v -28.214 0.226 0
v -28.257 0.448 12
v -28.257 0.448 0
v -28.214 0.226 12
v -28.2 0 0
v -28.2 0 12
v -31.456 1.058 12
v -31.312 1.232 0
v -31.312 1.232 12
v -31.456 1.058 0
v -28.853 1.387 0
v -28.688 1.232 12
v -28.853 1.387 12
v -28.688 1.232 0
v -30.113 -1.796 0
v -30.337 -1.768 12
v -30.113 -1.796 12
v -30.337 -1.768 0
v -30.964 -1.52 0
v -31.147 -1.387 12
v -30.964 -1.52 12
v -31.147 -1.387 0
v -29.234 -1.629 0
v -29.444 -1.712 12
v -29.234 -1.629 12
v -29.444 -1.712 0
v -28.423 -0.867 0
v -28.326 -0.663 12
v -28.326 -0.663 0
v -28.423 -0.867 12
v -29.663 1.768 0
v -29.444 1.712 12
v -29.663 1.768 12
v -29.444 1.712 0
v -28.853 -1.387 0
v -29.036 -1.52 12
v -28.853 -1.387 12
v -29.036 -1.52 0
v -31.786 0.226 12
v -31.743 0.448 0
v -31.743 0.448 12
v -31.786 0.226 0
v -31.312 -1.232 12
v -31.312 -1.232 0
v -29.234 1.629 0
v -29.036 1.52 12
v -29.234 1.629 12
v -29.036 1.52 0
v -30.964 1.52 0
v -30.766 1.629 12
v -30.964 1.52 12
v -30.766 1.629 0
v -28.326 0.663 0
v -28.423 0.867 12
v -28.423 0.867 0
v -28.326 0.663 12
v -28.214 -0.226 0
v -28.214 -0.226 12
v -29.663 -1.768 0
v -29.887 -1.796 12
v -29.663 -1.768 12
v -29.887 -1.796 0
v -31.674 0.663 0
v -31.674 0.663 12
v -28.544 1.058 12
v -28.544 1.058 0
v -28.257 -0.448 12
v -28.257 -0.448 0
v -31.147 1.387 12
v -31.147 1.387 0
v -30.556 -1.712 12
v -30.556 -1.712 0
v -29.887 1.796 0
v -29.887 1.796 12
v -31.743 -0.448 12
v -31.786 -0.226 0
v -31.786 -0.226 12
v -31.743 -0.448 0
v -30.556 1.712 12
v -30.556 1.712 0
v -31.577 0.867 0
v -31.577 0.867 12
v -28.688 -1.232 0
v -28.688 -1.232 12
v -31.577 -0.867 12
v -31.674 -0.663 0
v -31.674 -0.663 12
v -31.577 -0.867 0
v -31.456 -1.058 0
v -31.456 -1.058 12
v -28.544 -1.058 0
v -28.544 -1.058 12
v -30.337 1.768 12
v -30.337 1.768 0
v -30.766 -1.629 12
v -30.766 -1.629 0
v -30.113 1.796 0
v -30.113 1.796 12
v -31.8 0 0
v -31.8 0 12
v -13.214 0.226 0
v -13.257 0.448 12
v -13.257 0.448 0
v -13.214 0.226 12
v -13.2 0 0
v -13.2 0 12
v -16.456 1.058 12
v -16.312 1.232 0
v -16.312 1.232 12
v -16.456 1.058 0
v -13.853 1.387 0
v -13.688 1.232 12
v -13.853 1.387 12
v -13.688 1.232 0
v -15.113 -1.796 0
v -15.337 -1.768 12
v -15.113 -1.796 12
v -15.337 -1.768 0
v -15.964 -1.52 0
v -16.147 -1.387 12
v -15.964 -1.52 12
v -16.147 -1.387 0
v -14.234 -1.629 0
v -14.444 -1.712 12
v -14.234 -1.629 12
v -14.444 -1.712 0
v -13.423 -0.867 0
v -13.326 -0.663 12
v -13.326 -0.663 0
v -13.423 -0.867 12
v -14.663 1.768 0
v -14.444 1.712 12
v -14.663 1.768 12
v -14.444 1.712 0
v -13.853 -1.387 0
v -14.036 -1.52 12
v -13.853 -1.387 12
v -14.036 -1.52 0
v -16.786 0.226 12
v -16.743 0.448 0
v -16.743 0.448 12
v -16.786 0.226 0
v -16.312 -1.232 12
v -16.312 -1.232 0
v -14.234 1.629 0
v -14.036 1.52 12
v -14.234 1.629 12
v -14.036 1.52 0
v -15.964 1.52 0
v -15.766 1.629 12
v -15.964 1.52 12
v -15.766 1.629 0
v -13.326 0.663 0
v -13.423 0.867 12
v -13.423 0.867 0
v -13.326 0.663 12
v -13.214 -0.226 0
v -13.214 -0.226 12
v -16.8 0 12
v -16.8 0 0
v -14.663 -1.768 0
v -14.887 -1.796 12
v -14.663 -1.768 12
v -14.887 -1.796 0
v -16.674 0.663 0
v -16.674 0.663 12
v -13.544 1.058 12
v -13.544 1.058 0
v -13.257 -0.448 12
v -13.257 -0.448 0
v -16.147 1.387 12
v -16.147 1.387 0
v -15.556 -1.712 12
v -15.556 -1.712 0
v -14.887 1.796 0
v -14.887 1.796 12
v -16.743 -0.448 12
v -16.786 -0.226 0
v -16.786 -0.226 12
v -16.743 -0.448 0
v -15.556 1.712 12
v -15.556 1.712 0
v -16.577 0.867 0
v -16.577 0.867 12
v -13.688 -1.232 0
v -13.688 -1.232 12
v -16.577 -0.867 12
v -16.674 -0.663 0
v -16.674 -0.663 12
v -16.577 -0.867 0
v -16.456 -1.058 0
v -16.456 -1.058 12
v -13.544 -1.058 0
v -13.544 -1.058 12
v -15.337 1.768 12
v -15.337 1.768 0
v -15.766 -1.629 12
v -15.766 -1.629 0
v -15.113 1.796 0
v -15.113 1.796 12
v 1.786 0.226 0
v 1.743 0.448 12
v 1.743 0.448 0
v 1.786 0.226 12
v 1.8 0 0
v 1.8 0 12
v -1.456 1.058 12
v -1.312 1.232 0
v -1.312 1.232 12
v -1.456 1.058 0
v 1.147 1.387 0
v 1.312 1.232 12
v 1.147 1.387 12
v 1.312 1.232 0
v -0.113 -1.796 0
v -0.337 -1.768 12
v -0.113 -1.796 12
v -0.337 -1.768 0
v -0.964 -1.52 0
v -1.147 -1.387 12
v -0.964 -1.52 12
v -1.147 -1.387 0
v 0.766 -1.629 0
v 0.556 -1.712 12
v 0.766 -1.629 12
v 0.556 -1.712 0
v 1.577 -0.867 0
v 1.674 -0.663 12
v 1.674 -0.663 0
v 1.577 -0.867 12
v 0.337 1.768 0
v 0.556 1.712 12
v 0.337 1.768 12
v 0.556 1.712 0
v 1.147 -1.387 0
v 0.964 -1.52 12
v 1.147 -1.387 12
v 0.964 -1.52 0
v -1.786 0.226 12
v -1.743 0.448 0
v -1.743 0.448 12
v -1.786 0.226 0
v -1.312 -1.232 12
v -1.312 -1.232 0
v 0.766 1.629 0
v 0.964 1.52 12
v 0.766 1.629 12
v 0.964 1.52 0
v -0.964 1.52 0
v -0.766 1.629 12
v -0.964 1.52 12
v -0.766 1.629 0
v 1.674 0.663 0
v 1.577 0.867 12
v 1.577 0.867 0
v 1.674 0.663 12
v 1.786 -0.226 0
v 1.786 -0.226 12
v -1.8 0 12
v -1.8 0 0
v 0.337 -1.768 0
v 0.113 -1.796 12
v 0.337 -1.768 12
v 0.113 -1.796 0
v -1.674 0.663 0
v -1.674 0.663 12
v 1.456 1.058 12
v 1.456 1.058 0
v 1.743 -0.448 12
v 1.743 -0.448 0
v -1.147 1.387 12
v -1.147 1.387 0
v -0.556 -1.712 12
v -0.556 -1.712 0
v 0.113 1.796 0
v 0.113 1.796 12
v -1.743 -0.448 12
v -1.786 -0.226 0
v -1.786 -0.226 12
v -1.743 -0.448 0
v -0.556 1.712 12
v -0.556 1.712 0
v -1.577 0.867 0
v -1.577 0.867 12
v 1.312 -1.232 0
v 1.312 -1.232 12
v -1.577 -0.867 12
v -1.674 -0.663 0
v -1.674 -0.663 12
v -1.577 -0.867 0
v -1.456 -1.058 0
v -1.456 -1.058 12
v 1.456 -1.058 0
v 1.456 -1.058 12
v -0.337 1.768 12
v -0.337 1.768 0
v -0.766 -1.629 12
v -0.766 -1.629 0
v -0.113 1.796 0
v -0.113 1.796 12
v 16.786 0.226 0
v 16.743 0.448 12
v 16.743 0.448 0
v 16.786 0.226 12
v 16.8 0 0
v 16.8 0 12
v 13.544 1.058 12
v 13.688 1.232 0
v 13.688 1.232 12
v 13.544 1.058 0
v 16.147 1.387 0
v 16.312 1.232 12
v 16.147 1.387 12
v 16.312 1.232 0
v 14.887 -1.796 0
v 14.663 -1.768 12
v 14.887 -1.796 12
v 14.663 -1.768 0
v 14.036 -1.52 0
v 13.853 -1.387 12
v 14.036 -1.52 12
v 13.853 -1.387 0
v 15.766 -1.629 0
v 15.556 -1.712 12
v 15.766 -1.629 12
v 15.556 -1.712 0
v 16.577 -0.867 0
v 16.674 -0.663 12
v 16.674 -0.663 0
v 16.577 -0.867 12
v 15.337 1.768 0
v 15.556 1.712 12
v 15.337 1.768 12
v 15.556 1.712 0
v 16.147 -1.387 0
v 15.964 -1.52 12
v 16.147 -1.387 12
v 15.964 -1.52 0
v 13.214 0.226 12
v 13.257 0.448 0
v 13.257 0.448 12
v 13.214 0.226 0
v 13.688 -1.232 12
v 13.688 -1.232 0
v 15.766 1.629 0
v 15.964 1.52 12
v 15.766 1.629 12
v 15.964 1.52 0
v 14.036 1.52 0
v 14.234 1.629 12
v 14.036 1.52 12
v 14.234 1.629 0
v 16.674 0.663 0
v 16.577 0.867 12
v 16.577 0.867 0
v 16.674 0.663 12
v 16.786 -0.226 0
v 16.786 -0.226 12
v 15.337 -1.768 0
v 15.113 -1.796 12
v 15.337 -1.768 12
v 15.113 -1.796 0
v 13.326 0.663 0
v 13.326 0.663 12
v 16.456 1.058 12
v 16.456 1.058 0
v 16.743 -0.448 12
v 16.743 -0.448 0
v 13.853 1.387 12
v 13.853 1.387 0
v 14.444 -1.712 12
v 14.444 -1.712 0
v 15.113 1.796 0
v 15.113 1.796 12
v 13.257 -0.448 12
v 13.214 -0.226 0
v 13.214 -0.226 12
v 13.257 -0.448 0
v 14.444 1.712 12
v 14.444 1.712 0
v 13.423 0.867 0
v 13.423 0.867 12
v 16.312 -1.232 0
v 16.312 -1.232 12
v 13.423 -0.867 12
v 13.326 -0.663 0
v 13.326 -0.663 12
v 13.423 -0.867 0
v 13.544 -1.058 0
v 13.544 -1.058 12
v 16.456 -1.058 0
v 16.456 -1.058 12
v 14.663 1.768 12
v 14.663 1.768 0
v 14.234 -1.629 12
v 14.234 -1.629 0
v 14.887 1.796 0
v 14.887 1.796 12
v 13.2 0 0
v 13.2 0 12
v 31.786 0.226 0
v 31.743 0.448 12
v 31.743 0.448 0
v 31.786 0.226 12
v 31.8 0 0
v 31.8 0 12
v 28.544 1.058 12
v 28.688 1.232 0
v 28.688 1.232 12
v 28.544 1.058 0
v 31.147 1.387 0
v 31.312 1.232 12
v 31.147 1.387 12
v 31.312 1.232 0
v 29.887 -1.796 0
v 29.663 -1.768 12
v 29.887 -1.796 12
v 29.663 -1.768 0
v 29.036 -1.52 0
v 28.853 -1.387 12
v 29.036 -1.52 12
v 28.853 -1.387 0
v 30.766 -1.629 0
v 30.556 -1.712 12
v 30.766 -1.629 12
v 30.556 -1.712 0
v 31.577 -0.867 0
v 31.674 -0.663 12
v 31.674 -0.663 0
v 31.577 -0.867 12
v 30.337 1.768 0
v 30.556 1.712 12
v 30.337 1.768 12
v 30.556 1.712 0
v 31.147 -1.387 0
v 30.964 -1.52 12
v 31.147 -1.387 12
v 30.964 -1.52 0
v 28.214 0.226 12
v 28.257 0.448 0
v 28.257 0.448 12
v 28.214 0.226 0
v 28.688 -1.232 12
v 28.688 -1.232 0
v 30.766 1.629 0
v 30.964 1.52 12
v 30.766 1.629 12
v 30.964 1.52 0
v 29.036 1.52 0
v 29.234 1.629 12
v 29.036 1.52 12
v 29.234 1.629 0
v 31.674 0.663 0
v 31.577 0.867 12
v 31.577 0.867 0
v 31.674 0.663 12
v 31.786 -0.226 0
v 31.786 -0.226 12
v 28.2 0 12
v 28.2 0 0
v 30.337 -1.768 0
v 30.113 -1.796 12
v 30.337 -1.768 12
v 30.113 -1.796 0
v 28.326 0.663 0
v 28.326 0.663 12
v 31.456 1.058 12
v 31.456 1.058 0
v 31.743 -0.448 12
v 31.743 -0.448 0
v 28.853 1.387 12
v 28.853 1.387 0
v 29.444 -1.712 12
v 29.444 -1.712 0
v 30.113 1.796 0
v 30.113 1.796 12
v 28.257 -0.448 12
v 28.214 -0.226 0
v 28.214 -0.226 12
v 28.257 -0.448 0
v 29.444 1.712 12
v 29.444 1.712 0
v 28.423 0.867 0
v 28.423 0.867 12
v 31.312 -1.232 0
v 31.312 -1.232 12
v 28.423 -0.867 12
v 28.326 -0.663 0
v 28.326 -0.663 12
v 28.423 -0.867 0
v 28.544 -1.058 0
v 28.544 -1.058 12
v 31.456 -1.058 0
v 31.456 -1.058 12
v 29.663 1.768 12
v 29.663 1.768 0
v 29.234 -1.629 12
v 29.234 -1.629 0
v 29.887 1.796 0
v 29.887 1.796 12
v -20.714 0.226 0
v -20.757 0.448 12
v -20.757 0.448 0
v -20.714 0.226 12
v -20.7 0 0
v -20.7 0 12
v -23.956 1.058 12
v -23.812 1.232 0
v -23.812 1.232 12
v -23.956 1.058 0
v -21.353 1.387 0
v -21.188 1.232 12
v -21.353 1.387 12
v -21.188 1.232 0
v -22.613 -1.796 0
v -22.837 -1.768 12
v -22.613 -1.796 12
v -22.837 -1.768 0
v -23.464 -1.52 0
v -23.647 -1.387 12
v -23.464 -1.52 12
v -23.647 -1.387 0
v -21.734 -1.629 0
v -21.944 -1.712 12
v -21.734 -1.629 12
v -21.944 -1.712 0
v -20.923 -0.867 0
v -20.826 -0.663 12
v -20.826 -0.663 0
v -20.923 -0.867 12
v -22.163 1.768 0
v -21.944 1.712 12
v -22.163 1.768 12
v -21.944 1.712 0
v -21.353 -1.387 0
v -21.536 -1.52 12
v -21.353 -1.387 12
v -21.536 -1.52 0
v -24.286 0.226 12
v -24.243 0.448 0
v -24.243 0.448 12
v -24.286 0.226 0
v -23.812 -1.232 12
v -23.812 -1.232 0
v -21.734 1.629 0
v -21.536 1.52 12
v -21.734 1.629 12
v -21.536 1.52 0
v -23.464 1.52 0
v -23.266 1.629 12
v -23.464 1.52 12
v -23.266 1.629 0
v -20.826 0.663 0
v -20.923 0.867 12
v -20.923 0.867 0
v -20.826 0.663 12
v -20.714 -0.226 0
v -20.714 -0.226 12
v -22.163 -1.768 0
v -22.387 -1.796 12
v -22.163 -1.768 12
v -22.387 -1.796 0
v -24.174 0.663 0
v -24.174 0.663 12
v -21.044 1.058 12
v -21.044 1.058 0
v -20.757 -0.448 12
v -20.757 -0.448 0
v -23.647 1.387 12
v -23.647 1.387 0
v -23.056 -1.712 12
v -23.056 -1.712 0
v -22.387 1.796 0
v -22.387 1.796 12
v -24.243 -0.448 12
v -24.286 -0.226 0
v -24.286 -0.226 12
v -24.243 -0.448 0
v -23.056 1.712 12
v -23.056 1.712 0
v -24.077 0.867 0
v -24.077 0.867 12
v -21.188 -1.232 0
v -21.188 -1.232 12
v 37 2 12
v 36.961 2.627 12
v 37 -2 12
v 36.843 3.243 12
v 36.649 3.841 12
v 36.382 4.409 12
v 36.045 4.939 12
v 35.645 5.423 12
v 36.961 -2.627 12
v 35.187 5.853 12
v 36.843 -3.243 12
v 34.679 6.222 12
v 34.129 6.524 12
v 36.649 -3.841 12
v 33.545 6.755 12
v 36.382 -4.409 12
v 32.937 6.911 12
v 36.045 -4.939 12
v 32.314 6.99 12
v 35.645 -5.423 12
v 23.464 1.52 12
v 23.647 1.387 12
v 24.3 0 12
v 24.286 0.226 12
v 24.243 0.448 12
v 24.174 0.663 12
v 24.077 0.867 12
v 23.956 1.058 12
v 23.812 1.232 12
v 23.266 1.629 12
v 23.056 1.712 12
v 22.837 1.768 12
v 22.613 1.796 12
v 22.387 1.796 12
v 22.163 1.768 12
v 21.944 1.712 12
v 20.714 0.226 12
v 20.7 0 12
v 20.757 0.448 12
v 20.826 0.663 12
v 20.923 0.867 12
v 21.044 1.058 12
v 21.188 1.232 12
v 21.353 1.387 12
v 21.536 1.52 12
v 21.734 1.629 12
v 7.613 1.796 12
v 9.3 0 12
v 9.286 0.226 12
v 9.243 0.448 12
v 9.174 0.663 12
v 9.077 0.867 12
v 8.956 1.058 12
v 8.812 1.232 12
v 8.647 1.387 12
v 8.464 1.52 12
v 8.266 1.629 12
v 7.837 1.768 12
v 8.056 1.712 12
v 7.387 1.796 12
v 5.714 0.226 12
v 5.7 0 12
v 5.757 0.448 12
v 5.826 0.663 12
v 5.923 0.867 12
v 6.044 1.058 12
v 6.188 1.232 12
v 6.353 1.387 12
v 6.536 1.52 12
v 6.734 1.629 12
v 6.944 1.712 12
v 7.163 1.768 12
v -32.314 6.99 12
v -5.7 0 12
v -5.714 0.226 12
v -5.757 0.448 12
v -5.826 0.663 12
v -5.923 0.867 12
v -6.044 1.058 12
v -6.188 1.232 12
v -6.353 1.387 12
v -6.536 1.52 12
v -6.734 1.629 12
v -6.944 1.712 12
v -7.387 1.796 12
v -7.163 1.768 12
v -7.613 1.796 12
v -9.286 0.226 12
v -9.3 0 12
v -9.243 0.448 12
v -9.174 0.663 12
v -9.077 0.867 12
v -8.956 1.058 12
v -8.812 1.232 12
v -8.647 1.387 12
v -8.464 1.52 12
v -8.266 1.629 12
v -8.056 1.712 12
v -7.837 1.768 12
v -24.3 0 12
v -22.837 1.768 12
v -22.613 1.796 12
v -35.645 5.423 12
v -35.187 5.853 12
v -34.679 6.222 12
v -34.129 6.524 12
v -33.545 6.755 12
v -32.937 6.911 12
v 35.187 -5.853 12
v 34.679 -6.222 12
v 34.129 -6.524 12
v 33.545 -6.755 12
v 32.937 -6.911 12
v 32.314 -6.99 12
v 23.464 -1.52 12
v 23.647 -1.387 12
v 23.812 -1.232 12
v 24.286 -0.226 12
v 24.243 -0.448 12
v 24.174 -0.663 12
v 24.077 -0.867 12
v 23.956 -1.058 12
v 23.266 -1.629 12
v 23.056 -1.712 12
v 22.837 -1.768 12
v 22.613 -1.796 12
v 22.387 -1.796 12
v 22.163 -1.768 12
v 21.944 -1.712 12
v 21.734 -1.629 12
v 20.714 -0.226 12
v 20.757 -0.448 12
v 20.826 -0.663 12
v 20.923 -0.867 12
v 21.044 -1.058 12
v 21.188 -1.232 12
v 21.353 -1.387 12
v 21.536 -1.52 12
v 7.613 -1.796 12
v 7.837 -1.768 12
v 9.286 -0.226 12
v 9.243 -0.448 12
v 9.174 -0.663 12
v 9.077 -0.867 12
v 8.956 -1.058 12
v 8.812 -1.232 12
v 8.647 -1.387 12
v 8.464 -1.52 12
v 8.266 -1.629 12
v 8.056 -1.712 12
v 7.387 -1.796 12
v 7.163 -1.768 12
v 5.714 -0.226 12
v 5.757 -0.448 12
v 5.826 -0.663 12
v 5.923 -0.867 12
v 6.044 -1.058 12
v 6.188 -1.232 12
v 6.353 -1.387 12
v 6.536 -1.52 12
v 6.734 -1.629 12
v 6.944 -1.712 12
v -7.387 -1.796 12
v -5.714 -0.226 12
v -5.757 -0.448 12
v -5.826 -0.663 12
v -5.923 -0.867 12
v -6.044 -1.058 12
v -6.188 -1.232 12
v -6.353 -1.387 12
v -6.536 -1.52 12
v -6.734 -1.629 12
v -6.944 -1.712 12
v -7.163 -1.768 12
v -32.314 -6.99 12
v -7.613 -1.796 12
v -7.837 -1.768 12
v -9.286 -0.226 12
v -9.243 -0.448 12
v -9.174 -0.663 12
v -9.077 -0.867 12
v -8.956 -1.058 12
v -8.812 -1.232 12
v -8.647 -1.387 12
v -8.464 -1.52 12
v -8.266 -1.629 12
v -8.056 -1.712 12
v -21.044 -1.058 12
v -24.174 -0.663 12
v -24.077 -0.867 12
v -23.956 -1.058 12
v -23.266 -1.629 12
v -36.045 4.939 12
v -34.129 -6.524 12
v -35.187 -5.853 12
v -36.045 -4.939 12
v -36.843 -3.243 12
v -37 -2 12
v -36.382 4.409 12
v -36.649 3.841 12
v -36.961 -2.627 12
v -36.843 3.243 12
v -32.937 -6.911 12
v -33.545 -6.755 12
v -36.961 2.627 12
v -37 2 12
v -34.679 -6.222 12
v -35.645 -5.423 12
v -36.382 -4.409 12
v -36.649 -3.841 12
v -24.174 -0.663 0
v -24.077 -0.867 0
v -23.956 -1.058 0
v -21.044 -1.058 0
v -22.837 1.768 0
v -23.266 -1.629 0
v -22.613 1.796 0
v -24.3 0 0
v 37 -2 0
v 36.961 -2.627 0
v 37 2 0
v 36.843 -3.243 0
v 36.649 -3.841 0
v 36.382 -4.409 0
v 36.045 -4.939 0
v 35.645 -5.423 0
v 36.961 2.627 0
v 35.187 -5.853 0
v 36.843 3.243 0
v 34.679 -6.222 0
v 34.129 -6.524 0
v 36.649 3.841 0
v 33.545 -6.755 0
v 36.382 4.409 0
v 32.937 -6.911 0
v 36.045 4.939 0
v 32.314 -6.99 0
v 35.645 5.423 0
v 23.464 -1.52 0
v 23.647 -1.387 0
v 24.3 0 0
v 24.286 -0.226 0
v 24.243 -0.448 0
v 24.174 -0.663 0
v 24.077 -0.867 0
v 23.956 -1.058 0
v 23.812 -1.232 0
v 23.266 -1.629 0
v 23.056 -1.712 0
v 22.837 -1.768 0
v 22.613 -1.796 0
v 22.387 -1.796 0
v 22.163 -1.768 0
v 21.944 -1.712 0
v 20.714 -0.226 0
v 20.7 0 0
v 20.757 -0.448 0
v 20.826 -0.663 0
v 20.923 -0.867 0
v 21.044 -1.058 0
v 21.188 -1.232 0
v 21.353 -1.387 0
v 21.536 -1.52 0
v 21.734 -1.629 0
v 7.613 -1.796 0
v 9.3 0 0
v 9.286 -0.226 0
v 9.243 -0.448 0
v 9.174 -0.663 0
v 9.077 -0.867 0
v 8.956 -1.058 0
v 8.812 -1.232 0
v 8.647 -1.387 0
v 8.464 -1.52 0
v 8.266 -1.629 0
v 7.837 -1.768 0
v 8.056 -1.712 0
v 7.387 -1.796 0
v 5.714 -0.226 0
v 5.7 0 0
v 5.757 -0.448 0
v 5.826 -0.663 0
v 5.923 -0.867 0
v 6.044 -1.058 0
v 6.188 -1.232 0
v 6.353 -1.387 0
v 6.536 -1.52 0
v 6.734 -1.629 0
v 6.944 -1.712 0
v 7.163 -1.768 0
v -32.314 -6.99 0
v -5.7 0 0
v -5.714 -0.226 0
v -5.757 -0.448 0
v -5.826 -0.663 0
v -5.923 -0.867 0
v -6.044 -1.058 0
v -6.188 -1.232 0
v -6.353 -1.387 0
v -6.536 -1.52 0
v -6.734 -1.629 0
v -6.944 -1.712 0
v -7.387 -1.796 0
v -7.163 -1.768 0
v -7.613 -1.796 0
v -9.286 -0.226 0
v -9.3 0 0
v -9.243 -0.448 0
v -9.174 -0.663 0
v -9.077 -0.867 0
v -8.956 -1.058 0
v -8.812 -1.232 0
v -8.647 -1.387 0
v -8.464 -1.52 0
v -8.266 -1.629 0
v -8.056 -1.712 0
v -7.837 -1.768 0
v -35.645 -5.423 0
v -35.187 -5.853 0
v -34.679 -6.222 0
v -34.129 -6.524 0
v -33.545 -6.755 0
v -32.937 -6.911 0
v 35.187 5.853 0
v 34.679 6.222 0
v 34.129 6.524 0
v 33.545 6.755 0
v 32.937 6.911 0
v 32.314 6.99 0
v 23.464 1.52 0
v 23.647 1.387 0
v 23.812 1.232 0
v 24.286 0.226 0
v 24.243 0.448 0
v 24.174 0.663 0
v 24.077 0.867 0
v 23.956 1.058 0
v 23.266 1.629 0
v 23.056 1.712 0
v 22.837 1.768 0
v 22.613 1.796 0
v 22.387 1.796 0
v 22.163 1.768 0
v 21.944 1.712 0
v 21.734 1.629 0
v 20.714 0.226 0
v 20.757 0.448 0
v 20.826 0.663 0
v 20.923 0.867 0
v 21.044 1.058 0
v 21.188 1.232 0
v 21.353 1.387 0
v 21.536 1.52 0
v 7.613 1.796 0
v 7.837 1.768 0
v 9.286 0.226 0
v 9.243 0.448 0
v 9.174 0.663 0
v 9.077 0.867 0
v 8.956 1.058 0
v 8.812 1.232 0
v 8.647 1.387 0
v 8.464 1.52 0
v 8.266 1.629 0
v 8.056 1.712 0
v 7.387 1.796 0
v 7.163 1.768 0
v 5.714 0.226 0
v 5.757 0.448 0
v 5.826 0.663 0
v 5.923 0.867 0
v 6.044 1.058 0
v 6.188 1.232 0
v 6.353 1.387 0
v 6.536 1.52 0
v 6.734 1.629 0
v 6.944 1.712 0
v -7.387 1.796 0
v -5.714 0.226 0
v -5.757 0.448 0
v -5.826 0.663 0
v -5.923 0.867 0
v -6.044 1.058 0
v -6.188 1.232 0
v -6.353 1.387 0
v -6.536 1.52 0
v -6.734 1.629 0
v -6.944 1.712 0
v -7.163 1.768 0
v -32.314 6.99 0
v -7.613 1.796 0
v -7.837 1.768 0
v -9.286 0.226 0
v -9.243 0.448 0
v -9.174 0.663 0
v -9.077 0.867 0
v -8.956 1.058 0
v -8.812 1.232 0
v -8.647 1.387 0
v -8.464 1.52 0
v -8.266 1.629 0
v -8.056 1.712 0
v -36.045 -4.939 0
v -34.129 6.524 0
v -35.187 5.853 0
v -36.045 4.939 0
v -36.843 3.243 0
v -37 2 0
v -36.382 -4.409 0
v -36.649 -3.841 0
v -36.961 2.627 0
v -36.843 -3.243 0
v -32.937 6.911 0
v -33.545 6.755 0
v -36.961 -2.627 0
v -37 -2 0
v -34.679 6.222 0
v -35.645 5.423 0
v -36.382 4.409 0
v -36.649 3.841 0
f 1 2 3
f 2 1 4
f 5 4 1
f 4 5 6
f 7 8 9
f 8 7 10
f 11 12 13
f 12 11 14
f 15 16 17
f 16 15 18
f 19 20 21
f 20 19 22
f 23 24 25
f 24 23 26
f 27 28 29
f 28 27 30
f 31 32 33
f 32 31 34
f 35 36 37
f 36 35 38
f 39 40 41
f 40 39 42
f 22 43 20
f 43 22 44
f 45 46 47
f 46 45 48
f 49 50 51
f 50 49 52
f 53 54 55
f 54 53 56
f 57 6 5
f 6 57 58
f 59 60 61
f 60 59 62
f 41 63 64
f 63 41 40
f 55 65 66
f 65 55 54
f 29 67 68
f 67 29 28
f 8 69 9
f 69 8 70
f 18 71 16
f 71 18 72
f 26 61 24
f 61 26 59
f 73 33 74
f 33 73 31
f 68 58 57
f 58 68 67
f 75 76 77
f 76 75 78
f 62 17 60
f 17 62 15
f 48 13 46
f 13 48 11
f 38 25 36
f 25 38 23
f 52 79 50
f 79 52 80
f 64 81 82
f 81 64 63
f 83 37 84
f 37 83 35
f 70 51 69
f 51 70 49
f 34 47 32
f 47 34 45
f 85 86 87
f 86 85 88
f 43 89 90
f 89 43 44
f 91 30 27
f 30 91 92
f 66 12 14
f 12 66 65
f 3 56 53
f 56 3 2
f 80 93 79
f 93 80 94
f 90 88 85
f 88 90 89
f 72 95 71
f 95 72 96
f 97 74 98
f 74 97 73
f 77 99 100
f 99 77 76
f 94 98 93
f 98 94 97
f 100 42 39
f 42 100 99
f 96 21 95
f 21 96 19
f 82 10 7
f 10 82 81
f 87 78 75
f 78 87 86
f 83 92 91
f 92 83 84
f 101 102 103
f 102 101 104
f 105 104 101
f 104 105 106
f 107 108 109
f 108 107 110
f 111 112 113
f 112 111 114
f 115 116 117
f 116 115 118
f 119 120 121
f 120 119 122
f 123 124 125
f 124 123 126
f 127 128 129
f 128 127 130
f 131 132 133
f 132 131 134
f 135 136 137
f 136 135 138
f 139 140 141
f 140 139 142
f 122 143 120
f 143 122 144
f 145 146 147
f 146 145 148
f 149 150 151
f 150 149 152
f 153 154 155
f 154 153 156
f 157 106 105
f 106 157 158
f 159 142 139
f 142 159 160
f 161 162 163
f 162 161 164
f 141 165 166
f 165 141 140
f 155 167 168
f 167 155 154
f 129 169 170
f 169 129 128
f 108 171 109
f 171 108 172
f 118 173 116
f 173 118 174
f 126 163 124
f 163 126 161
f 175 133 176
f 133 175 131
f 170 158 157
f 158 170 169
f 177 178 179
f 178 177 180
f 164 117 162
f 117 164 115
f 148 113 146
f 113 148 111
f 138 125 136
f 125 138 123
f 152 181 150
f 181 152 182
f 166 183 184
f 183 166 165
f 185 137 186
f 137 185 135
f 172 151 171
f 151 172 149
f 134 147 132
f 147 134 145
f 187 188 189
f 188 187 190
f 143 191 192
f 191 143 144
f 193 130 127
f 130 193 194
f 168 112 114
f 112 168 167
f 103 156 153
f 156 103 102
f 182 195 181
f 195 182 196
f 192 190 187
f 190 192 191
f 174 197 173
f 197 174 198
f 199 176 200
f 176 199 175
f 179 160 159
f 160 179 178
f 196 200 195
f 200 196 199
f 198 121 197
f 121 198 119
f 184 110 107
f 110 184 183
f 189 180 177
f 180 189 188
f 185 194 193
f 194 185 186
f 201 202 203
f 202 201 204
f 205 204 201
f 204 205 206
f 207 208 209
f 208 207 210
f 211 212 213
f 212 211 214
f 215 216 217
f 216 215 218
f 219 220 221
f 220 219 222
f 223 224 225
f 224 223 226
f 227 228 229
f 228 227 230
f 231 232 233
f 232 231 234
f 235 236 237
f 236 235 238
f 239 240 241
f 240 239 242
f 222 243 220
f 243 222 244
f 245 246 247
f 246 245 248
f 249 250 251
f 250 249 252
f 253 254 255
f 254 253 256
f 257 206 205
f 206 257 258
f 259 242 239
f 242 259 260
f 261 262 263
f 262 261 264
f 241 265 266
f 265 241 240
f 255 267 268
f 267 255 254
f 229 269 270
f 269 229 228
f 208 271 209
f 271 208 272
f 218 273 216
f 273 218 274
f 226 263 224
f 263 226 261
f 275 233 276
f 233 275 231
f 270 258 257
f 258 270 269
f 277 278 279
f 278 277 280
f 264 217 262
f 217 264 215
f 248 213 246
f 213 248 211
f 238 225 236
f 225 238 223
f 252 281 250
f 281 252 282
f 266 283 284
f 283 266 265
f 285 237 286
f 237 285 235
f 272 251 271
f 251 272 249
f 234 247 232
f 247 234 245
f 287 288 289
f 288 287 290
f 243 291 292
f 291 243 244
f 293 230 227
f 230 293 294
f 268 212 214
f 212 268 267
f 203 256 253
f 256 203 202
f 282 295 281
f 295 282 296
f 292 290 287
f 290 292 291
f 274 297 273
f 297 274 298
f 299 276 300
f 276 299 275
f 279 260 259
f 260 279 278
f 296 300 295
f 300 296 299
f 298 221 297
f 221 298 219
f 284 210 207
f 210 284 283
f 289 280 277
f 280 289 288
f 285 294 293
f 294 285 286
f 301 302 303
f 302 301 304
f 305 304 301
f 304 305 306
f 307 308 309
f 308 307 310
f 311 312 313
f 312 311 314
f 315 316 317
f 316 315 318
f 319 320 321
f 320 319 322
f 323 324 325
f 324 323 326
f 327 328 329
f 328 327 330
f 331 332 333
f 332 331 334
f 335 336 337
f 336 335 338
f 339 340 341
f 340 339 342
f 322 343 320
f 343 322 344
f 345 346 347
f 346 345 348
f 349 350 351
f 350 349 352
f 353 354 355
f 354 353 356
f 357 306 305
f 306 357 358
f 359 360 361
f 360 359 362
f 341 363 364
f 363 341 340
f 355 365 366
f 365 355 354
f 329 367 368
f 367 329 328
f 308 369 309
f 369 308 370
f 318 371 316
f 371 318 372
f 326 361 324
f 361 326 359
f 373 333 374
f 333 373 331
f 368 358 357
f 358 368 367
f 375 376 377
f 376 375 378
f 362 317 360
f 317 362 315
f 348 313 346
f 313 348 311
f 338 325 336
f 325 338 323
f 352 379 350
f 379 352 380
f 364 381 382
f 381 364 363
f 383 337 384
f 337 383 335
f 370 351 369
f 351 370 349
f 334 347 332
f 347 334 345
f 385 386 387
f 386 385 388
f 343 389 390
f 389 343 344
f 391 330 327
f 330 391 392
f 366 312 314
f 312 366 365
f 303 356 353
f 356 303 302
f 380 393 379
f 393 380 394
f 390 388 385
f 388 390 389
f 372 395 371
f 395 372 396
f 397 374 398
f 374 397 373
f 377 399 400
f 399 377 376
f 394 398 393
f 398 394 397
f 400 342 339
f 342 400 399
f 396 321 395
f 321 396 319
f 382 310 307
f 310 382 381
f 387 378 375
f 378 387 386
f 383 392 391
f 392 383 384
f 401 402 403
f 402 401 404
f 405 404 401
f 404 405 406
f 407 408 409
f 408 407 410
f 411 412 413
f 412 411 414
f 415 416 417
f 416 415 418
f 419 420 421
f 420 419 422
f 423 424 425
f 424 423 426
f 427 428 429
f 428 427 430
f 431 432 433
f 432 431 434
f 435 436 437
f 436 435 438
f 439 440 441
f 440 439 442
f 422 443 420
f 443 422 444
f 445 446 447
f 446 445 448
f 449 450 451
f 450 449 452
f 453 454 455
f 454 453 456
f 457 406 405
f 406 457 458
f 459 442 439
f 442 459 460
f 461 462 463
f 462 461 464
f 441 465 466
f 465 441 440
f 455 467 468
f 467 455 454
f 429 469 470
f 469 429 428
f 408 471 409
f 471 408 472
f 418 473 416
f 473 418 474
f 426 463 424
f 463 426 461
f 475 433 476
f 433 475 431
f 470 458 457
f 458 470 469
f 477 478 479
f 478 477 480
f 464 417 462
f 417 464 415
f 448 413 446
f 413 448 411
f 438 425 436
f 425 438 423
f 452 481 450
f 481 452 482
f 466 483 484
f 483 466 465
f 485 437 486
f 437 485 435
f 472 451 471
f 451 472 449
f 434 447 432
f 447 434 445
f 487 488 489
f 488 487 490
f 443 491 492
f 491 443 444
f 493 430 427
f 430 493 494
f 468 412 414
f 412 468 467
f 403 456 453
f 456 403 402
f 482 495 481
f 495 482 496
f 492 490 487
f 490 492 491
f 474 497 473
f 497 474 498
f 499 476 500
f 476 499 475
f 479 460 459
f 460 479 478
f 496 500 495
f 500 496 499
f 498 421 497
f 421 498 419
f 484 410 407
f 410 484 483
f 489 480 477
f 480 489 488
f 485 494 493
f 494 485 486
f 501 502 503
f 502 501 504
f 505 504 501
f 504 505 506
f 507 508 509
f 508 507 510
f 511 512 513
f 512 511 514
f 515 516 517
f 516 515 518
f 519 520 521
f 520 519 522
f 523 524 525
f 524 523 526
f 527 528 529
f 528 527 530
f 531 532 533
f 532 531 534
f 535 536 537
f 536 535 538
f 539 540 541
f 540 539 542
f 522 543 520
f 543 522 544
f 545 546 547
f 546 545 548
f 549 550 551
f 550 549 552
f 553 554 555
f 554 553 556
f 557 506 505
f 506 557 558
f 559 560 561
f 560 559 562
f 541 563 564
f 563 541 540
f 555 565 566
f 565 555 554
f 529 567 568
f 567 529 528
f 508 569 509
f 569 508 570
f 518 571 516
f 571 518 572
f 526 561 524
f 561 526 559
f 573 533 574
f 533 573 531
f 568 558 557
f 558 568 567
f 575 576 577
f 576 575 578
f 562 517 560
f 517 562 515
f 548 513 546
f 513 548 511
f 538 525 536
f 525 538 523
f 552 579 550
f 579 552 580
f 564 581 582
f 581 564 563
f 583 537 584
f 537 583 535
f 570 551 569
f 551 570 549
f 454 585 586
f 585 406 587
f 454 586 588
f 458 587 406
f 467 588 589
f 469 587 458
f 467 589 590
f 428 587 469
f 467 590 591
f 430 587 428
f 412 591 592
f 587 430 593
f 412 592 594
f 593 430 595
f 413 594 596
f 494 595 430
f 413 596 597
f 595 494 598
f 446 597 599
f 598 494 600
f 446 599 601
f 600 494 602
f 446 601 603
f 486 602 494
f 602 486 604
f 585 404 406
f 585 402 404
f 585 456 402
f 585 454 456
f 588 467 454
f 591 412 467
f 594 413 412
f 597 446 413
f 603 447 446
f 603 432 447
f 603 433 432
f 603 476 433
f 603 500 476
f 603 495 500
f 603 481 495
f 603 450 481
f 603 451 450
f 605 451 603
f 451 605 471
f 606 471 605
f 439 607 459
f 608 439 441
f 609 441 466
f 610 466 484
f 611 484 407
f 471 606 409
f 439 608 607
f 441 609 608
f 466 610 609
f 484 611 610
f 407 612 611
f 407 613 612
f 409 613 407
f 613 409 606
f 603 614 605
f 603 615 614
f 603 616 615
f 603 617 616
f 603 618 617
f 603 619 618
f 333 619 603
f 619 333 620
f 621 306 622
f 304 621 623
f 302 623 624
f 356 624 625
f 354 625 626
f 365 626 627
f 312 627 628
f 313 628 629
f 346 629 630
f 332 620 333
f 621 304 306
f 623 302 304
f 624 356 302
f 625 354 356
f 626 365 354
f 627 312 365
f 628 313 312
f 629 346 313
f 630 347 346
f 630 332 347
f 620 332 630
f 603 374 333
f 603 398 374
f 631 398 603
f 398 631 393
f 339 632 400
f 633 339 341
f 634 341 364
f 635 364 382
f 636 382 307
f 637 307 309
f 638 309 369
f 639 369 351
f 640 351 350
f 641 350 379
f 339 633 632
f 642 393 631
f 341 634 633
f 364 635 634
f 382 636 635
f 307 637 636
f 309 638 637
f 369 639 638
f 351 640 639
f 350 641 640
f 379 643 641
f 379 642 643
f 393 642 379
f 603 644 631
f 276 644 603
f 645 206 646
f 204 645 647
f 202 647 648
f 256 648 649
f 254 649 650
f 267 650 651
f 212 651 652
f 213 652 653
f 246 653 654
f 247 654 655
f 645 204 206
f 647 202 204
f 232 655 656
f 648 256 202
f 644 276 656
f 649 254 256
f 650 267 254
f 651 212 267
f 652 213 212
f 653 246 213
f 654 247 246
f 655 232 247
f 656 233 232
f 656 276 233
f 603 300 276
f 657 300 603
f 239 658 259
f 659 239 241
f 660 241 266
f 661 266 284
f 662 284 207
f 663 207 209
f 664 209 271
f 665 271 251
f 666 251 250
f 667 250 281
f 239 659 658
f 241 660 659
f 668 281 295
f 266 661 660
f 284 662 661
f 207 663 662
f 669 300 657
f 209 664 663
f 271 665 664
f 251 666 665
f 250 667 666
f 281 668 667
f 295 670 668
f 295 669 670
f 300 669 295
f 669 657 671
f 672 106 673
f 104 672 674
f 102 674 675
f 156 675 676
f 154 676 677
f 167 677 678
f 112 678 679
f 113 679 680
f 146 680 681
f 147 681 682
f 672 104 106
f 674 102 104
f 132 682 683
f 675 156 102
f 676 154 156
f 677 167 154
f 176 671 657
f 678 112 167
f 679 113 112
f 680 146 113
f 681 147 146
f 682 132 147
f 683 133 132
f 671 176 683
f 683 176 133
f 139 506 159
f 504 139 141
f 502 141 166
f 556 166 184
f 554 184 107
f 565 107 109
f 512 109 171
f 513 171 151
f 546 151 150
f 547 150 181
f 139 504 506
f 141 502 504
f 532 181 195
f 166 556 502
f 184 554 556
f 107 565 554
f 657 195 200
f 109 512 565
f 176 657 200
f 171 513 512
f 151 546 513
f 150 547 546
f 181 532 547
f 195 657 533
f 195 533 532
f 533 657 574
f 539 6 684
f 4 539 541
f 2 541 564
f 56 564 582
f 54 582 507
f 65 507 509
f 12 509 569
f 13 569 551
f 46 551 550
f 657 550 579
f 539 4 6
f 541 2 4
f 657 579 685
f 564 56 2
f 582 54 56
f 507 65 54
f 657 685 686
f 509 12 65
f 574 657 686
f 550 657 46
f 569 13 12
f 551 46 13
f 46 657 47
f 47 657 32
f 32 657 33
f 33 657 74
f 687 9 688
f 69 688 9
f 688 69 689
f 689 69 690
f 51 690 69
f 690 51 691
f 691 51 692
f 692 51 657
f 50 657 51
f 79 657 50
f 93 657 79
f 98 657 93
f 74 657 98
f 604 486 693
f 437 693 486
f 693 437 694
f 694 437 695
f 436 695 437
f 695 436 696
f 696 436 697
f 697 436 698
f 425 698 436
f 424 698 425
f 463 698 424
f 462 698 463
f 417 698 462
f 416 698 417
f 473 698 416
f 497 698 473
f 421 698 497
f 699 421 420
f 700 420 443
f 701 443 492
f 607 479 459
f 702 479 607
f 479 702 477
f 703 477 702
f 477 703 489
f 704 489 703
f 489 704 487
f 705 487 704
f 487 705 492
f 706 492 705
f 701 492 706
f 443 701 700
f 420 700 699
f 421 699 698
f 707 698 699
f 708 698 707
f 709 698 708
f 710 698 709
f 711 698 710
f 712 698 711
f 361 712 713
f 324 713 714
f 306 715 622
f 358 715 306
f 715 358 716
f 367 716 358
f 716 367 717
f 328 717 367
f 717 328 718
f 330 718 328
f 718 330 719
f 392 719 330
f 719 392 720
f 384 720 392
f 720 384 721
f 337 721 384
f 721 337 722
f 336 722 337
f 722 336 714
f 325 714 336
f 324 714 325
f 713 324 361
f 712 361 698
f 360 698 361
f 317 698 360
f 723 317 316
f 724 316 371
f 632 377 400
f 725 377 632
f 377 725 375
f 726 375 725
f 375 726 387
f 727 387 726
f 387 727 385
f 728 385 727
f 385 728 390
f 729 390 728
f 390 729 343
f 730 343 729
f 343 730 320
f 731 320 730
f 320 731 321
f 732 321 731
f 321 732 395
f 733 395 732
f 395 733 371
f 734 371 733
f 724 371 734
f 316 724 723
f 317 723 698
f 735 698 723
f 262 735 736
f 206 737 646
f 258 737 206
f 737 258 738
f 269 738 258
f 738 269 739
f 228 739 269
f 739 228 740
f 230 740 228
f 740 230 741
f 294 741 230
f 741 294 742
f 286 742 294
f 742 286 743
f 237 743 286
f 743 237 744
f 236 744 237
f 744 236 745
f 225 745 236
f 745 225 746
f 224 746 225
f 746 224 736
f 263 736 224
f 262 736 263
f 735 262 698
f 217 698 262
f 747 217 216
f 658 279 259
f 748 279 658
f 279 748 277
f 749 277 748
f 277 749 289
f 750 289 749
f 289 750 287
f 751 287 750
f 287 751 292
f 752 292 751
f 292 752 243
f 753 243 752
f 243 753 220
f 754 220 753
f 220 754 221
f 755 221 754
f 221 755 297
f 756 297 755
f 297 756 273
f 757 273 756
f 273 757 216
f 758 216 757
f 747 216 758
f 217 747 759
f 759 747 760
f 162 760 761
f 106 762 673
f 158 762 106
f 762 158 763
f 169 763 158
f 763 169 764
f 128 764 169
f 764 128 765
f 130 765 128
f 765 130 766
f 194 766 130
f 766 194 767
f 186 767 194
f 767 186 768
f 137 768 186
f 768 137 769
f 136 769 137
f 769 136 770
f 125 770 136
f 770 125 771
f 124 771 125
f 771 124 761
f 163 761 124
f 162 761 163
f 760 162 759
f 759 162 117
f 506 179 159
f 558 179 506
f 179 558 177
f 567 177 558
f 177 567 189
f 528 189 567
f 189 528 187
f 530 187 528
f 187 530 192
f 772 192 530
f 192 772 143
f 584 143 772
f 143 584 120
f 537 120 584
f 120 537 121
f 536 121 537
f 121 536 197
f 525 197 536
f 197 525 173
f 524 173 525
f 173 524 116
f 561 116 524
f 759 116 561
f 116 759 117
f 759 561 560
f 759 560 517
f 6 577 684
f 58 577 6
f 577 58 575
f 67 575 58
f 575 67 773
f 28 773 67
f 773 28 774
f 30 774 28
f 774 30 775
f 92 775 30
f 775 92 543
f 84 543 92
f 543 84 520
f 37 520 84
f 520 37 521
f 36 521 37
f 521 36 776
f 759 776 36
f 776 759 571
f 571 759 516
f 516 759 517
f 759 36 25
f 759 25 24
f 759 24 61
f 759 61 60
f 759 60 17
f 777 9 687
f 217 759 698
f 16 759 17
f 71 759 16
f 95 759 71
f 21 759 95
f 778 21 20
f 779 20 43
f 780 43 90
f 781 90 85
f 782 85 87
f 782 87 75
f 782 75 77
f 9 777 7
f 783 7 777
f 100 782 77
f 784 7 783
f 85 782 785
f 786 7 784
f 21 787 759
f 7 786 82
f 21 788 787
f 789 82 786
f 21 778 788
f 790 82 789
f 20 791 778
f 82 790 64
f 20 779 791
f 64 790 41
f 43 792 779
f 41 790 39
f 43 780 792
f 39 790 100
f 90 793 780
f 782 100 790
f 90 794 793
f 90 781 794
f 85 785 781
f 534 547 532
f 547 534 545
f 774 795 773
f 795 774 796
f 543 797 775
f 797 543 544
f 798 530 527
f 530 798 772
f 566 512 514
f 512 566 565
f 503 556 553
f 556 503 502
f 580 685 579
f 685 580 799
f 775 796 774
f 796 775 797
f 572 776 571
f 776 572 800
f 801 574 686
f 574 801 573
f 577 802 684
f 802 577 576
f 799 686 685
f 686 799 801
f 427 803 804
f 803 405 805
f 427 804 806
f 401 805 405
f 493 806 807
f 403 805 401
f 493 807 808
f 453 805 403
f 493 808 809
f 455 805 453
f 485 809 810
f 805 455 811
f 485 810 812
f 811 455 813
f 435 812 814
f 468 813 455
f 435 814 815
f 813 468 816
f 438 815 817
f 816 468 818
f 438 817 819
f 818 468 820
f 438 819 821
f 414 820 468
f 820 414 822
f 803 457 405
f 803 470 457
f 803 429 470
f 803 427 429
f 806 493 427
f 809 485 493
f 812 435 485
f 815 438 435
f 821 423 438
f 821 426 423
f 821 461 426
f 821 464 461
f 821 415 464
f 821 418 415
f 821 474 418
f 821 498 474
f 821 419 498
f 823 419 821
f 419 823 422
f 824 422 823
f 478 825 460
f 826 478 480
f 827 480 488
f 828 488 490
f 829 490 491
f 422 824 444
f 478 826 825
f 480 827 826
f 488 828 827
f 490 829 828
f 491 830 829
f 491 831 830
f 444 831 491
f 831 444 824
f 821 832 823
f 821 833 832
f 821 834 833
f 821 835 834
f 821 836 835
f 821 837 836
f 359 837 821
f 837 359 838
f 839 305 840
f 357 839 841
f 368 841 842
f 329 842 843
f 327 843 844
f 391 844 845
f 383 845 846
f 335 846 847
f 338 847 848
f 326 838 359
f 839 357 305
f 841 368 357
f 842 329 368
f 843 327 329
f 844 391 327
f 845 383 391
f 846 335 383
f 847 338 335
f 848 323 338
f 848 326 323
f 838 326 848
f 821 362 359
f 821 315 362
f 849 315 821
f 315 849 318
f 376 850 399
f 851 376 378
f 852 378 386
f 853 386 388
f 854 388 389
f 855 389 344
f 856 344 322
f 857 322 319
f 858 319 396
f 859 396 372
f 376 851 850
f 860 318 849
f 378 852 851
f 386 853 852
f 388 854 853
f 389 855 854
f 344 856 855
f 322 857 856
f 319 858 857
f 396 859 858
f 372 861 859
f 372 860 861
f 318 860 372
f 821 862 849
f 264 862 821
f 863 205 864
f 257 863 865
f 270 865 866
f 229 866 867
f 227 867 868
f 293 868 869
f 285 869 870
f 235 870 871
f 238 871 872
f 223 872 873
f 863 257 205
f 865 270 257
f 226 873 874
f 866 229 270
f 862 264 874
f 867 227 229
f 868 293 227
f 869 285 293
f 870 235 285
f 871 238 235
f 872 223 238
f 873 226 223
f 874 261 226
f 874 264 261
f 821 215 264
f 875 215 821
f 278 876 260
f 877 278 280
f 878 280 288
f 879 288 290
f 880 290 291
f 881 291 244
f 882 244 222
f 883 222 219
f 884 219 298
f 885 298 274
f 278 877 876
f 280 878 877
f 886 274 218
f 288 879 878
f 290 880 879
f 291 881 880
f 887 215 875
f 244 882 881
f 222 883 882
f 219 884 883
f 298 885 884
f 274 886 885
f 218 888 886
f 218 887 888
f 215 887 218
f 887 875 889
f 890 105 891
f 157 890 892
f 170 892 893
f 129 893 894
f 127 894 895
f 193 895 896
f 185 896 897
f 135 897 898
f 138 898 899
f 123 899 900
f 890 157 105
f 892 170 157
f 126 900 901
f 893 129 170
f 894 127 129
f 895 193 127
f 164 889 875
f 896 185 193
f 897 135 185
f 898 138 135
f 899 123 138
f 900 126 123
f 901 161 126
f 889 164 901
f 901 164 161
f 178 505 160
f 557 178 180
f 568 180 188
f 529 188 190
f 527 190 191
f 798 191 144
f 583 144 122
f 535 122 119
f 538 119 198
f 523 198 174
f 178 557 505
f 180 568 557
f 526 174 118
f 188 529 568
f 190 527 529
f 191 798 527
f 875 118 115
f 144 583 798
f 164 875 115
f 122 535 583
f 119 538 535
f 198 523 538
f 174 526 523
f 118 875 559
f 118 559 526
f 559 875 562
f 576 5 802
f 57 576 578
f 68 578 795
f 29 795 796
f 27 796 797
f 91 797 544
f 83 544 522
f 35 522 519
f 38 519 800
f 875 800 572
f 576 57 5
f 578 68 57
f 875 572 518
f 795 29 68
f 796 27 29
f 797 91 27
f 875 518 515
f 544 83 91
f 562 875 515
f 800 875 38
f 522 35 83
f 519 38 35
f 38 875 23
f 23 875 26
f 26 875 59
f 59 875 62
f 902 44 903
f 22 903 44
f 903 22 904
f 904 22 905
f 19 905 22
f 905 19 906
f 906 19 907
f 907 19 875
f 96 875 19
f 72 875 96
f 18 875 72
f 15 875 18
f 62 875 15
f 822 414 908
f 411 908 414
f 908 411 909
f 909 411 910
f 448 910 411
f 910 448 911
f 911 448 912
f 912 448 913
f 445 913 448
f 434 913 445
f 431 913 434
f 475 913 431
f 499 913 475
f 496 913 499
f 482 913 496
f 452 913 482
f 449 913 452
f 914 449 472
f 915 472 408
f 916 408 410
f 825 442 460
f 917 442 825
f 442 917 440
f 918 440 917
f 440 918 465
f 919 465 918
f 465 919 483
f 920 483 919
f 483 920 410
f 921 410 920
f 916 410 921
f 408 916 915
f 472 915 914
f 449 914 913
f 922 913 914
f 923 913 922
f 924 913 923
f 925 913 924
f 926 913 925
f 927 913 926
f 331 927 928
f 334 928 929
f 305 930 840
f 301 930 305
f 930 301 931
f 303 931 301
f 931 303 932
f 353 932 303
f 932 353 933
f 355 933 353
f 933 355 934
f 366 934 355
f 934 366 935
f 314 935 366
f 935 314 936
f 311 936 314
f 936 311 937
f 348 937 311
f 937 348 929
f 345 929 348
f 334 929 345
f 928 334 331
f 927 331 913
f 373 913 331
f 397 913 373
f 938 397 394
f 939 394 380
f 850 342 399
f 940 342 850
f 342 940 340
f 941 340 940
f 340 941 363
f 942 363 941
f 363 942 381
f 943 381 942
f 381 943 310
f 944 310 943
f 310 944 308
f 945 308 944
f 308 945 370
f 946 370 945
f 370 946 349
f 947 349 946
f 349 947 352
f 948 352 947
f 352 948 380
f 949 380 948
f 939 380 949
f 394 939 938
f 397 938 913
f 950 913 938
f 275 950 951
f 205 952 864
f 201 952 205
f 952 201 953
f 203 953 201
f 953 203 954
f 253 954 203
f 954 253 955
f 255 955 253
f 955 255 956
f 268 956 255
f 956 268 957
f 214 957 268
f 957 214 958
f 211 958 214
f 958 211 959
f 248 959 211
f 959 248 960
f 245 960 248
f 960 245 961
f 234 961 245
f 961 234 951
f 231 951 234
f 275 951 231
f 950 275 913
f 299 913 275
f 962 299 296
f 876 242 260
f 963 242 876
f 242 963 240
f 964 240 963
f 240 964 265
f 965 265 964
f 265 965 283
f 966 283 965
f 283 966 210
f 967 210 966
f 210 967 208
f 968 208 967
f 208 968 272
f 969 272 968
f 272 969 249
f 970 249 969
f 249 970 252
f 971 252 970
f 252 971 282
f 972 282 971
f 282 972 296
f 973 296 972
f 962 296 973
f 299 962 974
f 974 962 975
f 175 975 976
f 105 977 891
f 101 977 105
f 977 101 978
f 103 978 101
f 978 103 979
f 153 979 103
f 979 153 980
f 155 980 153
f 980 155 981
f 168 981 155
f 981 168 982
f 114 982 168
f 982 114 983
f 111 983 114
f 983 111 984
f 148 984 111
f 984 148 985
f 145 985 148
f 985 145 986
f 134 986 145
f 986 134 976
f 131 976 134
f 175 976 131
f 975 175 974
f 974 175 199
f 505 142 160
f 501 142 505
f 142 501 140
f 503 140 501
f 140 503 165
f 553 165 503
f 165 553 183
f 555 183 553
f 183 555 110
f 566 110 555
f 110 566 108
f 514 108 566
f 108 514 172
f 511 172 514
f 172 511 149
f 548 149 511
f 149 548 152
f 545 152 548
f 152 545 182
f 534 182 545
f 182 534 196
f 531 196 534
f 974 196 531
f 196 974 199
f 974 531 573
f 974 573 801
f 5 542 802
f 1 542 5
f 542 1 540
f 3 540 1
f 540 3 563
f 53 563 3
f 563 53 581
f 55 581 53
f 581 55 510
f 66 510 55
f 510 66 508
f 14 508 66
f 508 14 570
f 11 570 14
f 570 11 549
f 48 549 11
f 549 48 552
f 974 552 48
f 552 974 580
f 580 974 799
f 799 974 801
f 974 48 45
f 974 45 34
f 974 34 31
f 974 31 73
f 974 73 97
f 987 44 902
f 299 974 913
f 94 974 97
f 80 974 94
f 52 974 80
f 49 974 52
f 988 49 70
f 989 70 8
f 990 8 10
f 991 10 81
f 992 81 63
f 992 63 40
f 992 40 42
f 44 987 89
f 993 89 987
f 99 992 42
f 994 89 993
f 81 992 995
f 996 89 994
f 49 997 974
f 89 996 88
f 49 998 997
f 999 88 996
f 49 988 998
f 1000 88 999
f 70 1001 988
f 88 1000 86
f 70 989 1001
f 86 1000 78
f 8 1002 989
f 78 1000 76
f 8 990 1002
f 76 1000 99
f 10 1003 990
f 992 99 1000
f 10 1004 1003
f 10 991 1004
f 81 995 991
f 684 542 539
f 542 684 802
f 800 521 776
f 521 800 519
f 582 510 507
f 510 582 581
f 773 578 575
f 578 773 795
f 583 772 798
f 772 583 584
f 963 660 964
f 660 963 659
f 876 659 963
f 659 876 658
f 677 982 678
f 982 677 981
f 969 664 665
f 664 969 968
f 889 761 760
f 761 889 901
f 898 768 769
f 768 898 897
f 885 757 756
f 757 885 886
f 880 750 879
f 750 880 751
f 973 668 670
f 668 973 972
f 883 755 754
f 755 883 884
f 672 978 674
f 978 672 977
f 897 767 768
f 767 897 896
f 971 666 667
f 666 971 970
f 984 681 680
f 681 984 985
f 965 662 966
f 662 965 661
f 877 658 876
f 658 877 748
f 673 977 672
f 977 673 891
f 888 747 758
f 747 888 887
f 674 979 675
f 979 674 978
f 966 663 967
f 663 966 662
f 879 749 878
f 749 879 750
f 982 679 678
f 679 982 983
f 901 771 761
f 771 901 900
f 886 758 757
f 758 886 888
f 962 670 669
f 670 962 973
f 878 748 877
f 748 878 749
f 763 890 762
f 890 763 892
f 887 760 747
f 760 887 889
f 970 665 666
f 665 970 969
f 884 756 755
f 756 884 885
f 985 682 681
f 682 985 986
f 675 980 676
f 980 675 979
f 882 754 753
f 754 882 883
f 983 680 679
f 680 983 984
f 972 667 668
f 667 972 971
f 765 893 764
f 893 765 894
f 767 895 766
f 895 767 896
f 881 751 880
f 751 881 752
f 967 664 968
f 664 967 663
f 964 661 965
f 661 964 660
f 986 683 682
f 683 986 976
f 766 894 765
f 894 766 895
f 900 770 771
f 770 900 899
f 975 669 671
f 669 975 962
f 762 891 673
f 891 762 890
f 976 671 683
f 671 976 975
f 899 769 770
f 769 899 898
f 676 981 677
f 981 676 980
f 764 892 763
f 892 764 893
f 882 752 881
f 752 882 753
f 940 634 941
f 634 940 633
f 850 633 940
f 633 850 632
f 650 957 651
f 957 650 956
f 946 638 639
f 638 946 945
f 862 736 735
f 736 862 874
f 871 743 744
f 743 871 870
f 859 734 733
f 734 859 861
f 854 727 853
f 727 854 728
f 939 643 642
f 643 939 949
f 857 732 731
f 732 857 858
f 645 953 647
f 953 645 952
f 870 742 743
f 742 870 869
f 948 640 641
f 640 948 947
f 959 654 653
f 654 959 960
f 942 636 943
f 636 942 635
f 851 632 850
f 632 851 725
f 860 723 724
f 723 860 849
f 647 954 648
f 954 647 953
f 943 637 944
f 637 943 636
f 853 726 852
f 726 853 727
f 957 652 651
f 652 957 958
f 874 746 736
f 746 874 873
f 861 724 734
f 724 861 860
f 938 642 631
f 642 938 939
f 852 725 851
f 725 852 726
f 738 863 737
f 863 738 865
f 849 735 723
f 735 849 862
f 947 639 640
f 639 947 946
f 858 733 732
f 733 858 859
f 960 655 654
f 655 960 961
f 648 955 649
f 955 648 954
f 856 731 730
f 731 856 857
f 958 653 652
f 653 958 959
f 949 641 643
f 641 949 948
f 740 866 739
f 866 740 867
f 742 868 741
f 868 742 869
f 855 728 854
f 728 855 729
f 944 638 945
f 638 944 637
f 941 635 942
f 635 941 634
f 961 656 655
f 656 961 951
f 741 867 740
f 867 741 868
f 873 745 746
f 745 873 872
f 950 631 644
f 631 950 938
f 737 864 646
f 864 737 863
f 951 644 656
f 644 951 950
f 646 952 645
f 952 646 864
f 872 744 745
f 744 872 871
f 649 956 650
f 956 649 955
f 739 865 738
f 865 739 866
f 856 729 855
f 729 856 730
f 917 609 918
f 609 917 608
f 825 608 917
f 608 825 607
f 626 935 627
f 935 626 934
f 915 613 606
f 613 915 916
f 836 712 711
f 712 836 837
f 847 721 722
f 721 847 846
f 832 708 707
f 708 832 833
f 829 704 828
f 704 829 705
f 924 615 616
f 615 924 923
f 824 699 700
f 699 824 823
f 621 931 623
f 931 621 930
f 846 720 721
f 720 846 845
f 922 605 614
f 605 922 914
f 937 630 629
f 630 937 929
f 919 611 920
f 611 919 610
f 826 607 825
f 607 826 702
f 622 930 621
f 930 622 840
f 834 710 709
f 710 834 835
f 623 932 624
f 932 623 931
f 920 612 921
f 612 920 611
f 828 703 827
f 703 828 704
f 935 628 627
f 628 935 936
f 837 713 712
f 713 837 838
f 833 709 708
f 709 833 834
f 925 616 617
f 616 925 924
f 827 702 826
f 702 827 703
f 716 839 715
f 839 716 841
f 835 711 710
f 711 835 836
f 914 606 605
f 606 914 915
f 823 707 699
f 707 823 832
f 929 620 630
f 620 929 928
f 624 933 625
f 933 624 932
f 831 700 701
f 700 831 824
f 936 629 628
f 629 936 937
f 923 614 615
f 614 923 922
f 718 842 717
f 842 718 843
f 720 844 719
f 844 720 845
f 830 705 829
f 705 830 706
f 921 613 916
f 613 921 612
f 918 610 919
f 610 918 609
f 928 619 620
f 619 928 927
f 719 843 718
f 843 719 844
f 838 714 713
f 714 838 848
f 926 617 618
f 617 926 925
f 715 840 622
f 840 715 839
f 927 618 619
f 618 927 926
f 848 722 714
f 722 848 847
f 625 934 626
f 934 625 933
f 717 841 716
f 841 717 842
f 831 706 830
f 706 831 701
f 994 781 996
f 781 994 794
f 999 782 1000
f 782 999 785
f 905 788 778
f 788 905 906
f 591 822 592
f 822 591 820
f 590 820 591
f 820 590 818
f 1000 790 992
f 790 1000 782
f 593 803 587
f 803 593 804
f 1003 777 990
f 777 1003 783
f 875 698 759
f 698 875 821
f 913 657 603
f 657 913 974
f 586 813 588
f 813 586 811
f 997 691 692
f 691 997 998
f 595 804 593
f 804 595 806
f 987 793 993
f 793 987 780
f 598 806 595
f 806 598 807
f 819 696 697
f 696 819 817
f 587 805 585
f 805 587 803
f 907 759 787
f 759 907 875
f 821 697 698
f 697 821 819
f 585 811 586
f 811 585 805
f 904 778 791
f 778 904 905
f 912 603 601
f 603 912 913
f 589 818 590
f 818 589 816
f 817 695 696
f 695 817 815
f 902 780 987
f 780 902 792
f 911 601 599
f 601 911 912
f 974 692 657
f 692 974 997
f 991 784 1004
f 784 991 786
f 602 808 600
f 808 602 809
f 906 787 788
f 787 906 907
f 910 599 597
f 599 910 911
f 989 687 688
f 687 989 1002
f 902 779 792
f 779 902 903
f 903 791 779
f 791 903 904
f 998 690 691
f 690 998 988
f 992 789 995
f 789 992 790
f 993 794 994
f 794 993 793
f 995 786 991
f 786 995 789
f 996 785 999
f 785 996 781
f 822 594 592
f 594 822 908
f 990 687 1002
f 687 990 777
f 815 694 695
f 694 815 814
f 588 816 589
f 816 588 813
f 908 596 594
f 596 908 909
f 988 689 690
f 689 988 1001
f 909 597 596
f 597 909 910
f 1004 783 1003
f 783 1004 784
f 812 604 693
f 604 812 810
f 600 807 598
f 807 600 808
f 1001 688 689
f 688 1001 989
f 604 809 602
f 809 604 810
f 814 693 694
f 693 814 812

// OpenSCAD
$fn = 50;


difference() {
	union() {
		hull() {
			translate(v = [-32.0000000000, 2.0000000000, 0]) {
				cylinder(h = 12, r = 5);
			}
			translate(v = [32.0000000000, 2.0000000000, 0]) {
				cylinder(h = 12, r = 5);
			}
			translate(v = [-32.0000000000, -2.0000000000, 0]) {
				cylinder(h = 12, r = 5);
			}
			translate(v = [32.0000000000, -2.0000000000, 0]) {
				cylinder(h = 12, r = 5);
			}
		}
	}
	union() {
		translate(v = [-30.0000000000, 0.0000000000, -100.0000000000]) {
			cylinder(h = 200, r = 1.8000000000);
		}
		translate(v = [-15.0000000000, 0.0000000000, -100.0000000000]) {
			cylinder(h = 200, r = 1.8000000000);
		}
		translate(v = [0.0000000000, 0.0000000000, -100.0000000000]) {
			cylinder(h = 200, r = 1.8000000000);
		}
		translate(v = [15.0000000000, 0.0000000000, -100.0000000000]) {
			cylinder(h = 200, r = 1.8000000000);
		}
		translate(v = [30.0000000000, 0.0000000000, -100.0000000000]) {
			cylinder(h = 200, r = 1.8000000000);
		}
		translate(v = [-30.0000000000, 0.0000000000, 0]) {
			cylinder(h = 12, r = 1.8000000000);
		}
		translate(v = [-22.5000000000, 0.0000000000, 0]) {
			cylinder(h = 12, r = 1.8000000000);
		}
		translate(v = [-15.0000000000, 0.0000000000, 0]) {
			cylinder(h = 12, r = 1.8000000000);
		}
		translate(v = [-7.5000000000, 0.0000000000, 0]) {
			cylinder(h = 12, r = 1.8000000000);
		}
		cylinder(h = 12, r = 1.8000000000);
		translate(v = [7.5000000000, 0.0000000000, 0]) {
			cylinder(h = 12, r = 1.8000000000);
		}
		translate(v = [15.0000000000, 0.0000000000, 0]) {
			cylinder(h = 12, r = 1.8000000000);
		}
		translate(v = [22.5000000000, 0.0000000000, 0]) {
			cylinder(h = 12, r = 1.8000000000);
		}
		translate(v = [30.0000000000, 0.0000000000, 0]) {
			cylinder(h = 12, r = 1.8000000000);
		}
		translate(v = [-30.0000000000, 0.0000000000, 0]) {
			cylinder(h = 12, r = 1.8000000000);
		}
		translate(v = [-22.5000000000, 0.0000000000, 0]) {
			cylinder(h = 12, r = 1.8000000000);
		}
		translate(v = [-15.0000000000, 0.0000000000, 0]) {
			cylinder(h = 12, r = 1.8000000000);
		}
		translate(v = [-7.5000000000, 0.0000000000, 0]) {
			cylinder(h = 12, r = 1.8000000000);
		}
		cylinder(h = 12, r = 1.8000000000);
		translate(v = [7.5000000000, 0.0000000000, 0]) {
			cylinder(h = 12, r = 1.8000000000);
		}
		translate(v = [15.0000000000, 0.0000000000, 0]) {
			cylinder(h = 12, r = 1.8000000000);
		}
		translate(v = [22.5000000000, 0.0000000000, 0]) {
			cylinder(h = 12, r = 1.8000000000);
		}
		translate(v = [30.0000000000, 0.0000000000, 0]) {
			cylinder(h = 12, r = 1.8000000000);
		}
		translate(v = [-30.0000000000, 0.0000000000, 0]) {
			cylinder(h = 12, r = 1.8000000000);
		}
		translate(v = [-22.5000000000, 0.0000000000, 0]) {
			cylinder(h = 12, r = 1.8000000000);
		}
		translate(v = [-15.0000000000, 0.0000000000, 0]) {
			cylinder(h = 12, r = 1.8000000000);
		}
		translate(v = [-7.5000000000, 0.0000000000, 0]) {
			cylinder(h = 12, r = 1.8000000000);
		}
		cylinder(h = 12, r = 1.8000000000);
		translate(v = [7.5000000000, 0.0000000000, 0]) {
			cylinder(h = 12, r = 1.8000000000);
		}
		translate(v = [15.0000000000, 0.0000000000, 0]) {
			cylinder(h = 12, r = 1.8000000000);
		}
		translate(v = [22.5000000000, 0.0000000000, 0]) {
			cylinder(h = 12, r = 1.8000000000);
		}
		translate(v = [30.0000000000, 0.0000000000, 0]) {
			cylinder(h = 12, r = 1.8000000000);
		}
	}
}
